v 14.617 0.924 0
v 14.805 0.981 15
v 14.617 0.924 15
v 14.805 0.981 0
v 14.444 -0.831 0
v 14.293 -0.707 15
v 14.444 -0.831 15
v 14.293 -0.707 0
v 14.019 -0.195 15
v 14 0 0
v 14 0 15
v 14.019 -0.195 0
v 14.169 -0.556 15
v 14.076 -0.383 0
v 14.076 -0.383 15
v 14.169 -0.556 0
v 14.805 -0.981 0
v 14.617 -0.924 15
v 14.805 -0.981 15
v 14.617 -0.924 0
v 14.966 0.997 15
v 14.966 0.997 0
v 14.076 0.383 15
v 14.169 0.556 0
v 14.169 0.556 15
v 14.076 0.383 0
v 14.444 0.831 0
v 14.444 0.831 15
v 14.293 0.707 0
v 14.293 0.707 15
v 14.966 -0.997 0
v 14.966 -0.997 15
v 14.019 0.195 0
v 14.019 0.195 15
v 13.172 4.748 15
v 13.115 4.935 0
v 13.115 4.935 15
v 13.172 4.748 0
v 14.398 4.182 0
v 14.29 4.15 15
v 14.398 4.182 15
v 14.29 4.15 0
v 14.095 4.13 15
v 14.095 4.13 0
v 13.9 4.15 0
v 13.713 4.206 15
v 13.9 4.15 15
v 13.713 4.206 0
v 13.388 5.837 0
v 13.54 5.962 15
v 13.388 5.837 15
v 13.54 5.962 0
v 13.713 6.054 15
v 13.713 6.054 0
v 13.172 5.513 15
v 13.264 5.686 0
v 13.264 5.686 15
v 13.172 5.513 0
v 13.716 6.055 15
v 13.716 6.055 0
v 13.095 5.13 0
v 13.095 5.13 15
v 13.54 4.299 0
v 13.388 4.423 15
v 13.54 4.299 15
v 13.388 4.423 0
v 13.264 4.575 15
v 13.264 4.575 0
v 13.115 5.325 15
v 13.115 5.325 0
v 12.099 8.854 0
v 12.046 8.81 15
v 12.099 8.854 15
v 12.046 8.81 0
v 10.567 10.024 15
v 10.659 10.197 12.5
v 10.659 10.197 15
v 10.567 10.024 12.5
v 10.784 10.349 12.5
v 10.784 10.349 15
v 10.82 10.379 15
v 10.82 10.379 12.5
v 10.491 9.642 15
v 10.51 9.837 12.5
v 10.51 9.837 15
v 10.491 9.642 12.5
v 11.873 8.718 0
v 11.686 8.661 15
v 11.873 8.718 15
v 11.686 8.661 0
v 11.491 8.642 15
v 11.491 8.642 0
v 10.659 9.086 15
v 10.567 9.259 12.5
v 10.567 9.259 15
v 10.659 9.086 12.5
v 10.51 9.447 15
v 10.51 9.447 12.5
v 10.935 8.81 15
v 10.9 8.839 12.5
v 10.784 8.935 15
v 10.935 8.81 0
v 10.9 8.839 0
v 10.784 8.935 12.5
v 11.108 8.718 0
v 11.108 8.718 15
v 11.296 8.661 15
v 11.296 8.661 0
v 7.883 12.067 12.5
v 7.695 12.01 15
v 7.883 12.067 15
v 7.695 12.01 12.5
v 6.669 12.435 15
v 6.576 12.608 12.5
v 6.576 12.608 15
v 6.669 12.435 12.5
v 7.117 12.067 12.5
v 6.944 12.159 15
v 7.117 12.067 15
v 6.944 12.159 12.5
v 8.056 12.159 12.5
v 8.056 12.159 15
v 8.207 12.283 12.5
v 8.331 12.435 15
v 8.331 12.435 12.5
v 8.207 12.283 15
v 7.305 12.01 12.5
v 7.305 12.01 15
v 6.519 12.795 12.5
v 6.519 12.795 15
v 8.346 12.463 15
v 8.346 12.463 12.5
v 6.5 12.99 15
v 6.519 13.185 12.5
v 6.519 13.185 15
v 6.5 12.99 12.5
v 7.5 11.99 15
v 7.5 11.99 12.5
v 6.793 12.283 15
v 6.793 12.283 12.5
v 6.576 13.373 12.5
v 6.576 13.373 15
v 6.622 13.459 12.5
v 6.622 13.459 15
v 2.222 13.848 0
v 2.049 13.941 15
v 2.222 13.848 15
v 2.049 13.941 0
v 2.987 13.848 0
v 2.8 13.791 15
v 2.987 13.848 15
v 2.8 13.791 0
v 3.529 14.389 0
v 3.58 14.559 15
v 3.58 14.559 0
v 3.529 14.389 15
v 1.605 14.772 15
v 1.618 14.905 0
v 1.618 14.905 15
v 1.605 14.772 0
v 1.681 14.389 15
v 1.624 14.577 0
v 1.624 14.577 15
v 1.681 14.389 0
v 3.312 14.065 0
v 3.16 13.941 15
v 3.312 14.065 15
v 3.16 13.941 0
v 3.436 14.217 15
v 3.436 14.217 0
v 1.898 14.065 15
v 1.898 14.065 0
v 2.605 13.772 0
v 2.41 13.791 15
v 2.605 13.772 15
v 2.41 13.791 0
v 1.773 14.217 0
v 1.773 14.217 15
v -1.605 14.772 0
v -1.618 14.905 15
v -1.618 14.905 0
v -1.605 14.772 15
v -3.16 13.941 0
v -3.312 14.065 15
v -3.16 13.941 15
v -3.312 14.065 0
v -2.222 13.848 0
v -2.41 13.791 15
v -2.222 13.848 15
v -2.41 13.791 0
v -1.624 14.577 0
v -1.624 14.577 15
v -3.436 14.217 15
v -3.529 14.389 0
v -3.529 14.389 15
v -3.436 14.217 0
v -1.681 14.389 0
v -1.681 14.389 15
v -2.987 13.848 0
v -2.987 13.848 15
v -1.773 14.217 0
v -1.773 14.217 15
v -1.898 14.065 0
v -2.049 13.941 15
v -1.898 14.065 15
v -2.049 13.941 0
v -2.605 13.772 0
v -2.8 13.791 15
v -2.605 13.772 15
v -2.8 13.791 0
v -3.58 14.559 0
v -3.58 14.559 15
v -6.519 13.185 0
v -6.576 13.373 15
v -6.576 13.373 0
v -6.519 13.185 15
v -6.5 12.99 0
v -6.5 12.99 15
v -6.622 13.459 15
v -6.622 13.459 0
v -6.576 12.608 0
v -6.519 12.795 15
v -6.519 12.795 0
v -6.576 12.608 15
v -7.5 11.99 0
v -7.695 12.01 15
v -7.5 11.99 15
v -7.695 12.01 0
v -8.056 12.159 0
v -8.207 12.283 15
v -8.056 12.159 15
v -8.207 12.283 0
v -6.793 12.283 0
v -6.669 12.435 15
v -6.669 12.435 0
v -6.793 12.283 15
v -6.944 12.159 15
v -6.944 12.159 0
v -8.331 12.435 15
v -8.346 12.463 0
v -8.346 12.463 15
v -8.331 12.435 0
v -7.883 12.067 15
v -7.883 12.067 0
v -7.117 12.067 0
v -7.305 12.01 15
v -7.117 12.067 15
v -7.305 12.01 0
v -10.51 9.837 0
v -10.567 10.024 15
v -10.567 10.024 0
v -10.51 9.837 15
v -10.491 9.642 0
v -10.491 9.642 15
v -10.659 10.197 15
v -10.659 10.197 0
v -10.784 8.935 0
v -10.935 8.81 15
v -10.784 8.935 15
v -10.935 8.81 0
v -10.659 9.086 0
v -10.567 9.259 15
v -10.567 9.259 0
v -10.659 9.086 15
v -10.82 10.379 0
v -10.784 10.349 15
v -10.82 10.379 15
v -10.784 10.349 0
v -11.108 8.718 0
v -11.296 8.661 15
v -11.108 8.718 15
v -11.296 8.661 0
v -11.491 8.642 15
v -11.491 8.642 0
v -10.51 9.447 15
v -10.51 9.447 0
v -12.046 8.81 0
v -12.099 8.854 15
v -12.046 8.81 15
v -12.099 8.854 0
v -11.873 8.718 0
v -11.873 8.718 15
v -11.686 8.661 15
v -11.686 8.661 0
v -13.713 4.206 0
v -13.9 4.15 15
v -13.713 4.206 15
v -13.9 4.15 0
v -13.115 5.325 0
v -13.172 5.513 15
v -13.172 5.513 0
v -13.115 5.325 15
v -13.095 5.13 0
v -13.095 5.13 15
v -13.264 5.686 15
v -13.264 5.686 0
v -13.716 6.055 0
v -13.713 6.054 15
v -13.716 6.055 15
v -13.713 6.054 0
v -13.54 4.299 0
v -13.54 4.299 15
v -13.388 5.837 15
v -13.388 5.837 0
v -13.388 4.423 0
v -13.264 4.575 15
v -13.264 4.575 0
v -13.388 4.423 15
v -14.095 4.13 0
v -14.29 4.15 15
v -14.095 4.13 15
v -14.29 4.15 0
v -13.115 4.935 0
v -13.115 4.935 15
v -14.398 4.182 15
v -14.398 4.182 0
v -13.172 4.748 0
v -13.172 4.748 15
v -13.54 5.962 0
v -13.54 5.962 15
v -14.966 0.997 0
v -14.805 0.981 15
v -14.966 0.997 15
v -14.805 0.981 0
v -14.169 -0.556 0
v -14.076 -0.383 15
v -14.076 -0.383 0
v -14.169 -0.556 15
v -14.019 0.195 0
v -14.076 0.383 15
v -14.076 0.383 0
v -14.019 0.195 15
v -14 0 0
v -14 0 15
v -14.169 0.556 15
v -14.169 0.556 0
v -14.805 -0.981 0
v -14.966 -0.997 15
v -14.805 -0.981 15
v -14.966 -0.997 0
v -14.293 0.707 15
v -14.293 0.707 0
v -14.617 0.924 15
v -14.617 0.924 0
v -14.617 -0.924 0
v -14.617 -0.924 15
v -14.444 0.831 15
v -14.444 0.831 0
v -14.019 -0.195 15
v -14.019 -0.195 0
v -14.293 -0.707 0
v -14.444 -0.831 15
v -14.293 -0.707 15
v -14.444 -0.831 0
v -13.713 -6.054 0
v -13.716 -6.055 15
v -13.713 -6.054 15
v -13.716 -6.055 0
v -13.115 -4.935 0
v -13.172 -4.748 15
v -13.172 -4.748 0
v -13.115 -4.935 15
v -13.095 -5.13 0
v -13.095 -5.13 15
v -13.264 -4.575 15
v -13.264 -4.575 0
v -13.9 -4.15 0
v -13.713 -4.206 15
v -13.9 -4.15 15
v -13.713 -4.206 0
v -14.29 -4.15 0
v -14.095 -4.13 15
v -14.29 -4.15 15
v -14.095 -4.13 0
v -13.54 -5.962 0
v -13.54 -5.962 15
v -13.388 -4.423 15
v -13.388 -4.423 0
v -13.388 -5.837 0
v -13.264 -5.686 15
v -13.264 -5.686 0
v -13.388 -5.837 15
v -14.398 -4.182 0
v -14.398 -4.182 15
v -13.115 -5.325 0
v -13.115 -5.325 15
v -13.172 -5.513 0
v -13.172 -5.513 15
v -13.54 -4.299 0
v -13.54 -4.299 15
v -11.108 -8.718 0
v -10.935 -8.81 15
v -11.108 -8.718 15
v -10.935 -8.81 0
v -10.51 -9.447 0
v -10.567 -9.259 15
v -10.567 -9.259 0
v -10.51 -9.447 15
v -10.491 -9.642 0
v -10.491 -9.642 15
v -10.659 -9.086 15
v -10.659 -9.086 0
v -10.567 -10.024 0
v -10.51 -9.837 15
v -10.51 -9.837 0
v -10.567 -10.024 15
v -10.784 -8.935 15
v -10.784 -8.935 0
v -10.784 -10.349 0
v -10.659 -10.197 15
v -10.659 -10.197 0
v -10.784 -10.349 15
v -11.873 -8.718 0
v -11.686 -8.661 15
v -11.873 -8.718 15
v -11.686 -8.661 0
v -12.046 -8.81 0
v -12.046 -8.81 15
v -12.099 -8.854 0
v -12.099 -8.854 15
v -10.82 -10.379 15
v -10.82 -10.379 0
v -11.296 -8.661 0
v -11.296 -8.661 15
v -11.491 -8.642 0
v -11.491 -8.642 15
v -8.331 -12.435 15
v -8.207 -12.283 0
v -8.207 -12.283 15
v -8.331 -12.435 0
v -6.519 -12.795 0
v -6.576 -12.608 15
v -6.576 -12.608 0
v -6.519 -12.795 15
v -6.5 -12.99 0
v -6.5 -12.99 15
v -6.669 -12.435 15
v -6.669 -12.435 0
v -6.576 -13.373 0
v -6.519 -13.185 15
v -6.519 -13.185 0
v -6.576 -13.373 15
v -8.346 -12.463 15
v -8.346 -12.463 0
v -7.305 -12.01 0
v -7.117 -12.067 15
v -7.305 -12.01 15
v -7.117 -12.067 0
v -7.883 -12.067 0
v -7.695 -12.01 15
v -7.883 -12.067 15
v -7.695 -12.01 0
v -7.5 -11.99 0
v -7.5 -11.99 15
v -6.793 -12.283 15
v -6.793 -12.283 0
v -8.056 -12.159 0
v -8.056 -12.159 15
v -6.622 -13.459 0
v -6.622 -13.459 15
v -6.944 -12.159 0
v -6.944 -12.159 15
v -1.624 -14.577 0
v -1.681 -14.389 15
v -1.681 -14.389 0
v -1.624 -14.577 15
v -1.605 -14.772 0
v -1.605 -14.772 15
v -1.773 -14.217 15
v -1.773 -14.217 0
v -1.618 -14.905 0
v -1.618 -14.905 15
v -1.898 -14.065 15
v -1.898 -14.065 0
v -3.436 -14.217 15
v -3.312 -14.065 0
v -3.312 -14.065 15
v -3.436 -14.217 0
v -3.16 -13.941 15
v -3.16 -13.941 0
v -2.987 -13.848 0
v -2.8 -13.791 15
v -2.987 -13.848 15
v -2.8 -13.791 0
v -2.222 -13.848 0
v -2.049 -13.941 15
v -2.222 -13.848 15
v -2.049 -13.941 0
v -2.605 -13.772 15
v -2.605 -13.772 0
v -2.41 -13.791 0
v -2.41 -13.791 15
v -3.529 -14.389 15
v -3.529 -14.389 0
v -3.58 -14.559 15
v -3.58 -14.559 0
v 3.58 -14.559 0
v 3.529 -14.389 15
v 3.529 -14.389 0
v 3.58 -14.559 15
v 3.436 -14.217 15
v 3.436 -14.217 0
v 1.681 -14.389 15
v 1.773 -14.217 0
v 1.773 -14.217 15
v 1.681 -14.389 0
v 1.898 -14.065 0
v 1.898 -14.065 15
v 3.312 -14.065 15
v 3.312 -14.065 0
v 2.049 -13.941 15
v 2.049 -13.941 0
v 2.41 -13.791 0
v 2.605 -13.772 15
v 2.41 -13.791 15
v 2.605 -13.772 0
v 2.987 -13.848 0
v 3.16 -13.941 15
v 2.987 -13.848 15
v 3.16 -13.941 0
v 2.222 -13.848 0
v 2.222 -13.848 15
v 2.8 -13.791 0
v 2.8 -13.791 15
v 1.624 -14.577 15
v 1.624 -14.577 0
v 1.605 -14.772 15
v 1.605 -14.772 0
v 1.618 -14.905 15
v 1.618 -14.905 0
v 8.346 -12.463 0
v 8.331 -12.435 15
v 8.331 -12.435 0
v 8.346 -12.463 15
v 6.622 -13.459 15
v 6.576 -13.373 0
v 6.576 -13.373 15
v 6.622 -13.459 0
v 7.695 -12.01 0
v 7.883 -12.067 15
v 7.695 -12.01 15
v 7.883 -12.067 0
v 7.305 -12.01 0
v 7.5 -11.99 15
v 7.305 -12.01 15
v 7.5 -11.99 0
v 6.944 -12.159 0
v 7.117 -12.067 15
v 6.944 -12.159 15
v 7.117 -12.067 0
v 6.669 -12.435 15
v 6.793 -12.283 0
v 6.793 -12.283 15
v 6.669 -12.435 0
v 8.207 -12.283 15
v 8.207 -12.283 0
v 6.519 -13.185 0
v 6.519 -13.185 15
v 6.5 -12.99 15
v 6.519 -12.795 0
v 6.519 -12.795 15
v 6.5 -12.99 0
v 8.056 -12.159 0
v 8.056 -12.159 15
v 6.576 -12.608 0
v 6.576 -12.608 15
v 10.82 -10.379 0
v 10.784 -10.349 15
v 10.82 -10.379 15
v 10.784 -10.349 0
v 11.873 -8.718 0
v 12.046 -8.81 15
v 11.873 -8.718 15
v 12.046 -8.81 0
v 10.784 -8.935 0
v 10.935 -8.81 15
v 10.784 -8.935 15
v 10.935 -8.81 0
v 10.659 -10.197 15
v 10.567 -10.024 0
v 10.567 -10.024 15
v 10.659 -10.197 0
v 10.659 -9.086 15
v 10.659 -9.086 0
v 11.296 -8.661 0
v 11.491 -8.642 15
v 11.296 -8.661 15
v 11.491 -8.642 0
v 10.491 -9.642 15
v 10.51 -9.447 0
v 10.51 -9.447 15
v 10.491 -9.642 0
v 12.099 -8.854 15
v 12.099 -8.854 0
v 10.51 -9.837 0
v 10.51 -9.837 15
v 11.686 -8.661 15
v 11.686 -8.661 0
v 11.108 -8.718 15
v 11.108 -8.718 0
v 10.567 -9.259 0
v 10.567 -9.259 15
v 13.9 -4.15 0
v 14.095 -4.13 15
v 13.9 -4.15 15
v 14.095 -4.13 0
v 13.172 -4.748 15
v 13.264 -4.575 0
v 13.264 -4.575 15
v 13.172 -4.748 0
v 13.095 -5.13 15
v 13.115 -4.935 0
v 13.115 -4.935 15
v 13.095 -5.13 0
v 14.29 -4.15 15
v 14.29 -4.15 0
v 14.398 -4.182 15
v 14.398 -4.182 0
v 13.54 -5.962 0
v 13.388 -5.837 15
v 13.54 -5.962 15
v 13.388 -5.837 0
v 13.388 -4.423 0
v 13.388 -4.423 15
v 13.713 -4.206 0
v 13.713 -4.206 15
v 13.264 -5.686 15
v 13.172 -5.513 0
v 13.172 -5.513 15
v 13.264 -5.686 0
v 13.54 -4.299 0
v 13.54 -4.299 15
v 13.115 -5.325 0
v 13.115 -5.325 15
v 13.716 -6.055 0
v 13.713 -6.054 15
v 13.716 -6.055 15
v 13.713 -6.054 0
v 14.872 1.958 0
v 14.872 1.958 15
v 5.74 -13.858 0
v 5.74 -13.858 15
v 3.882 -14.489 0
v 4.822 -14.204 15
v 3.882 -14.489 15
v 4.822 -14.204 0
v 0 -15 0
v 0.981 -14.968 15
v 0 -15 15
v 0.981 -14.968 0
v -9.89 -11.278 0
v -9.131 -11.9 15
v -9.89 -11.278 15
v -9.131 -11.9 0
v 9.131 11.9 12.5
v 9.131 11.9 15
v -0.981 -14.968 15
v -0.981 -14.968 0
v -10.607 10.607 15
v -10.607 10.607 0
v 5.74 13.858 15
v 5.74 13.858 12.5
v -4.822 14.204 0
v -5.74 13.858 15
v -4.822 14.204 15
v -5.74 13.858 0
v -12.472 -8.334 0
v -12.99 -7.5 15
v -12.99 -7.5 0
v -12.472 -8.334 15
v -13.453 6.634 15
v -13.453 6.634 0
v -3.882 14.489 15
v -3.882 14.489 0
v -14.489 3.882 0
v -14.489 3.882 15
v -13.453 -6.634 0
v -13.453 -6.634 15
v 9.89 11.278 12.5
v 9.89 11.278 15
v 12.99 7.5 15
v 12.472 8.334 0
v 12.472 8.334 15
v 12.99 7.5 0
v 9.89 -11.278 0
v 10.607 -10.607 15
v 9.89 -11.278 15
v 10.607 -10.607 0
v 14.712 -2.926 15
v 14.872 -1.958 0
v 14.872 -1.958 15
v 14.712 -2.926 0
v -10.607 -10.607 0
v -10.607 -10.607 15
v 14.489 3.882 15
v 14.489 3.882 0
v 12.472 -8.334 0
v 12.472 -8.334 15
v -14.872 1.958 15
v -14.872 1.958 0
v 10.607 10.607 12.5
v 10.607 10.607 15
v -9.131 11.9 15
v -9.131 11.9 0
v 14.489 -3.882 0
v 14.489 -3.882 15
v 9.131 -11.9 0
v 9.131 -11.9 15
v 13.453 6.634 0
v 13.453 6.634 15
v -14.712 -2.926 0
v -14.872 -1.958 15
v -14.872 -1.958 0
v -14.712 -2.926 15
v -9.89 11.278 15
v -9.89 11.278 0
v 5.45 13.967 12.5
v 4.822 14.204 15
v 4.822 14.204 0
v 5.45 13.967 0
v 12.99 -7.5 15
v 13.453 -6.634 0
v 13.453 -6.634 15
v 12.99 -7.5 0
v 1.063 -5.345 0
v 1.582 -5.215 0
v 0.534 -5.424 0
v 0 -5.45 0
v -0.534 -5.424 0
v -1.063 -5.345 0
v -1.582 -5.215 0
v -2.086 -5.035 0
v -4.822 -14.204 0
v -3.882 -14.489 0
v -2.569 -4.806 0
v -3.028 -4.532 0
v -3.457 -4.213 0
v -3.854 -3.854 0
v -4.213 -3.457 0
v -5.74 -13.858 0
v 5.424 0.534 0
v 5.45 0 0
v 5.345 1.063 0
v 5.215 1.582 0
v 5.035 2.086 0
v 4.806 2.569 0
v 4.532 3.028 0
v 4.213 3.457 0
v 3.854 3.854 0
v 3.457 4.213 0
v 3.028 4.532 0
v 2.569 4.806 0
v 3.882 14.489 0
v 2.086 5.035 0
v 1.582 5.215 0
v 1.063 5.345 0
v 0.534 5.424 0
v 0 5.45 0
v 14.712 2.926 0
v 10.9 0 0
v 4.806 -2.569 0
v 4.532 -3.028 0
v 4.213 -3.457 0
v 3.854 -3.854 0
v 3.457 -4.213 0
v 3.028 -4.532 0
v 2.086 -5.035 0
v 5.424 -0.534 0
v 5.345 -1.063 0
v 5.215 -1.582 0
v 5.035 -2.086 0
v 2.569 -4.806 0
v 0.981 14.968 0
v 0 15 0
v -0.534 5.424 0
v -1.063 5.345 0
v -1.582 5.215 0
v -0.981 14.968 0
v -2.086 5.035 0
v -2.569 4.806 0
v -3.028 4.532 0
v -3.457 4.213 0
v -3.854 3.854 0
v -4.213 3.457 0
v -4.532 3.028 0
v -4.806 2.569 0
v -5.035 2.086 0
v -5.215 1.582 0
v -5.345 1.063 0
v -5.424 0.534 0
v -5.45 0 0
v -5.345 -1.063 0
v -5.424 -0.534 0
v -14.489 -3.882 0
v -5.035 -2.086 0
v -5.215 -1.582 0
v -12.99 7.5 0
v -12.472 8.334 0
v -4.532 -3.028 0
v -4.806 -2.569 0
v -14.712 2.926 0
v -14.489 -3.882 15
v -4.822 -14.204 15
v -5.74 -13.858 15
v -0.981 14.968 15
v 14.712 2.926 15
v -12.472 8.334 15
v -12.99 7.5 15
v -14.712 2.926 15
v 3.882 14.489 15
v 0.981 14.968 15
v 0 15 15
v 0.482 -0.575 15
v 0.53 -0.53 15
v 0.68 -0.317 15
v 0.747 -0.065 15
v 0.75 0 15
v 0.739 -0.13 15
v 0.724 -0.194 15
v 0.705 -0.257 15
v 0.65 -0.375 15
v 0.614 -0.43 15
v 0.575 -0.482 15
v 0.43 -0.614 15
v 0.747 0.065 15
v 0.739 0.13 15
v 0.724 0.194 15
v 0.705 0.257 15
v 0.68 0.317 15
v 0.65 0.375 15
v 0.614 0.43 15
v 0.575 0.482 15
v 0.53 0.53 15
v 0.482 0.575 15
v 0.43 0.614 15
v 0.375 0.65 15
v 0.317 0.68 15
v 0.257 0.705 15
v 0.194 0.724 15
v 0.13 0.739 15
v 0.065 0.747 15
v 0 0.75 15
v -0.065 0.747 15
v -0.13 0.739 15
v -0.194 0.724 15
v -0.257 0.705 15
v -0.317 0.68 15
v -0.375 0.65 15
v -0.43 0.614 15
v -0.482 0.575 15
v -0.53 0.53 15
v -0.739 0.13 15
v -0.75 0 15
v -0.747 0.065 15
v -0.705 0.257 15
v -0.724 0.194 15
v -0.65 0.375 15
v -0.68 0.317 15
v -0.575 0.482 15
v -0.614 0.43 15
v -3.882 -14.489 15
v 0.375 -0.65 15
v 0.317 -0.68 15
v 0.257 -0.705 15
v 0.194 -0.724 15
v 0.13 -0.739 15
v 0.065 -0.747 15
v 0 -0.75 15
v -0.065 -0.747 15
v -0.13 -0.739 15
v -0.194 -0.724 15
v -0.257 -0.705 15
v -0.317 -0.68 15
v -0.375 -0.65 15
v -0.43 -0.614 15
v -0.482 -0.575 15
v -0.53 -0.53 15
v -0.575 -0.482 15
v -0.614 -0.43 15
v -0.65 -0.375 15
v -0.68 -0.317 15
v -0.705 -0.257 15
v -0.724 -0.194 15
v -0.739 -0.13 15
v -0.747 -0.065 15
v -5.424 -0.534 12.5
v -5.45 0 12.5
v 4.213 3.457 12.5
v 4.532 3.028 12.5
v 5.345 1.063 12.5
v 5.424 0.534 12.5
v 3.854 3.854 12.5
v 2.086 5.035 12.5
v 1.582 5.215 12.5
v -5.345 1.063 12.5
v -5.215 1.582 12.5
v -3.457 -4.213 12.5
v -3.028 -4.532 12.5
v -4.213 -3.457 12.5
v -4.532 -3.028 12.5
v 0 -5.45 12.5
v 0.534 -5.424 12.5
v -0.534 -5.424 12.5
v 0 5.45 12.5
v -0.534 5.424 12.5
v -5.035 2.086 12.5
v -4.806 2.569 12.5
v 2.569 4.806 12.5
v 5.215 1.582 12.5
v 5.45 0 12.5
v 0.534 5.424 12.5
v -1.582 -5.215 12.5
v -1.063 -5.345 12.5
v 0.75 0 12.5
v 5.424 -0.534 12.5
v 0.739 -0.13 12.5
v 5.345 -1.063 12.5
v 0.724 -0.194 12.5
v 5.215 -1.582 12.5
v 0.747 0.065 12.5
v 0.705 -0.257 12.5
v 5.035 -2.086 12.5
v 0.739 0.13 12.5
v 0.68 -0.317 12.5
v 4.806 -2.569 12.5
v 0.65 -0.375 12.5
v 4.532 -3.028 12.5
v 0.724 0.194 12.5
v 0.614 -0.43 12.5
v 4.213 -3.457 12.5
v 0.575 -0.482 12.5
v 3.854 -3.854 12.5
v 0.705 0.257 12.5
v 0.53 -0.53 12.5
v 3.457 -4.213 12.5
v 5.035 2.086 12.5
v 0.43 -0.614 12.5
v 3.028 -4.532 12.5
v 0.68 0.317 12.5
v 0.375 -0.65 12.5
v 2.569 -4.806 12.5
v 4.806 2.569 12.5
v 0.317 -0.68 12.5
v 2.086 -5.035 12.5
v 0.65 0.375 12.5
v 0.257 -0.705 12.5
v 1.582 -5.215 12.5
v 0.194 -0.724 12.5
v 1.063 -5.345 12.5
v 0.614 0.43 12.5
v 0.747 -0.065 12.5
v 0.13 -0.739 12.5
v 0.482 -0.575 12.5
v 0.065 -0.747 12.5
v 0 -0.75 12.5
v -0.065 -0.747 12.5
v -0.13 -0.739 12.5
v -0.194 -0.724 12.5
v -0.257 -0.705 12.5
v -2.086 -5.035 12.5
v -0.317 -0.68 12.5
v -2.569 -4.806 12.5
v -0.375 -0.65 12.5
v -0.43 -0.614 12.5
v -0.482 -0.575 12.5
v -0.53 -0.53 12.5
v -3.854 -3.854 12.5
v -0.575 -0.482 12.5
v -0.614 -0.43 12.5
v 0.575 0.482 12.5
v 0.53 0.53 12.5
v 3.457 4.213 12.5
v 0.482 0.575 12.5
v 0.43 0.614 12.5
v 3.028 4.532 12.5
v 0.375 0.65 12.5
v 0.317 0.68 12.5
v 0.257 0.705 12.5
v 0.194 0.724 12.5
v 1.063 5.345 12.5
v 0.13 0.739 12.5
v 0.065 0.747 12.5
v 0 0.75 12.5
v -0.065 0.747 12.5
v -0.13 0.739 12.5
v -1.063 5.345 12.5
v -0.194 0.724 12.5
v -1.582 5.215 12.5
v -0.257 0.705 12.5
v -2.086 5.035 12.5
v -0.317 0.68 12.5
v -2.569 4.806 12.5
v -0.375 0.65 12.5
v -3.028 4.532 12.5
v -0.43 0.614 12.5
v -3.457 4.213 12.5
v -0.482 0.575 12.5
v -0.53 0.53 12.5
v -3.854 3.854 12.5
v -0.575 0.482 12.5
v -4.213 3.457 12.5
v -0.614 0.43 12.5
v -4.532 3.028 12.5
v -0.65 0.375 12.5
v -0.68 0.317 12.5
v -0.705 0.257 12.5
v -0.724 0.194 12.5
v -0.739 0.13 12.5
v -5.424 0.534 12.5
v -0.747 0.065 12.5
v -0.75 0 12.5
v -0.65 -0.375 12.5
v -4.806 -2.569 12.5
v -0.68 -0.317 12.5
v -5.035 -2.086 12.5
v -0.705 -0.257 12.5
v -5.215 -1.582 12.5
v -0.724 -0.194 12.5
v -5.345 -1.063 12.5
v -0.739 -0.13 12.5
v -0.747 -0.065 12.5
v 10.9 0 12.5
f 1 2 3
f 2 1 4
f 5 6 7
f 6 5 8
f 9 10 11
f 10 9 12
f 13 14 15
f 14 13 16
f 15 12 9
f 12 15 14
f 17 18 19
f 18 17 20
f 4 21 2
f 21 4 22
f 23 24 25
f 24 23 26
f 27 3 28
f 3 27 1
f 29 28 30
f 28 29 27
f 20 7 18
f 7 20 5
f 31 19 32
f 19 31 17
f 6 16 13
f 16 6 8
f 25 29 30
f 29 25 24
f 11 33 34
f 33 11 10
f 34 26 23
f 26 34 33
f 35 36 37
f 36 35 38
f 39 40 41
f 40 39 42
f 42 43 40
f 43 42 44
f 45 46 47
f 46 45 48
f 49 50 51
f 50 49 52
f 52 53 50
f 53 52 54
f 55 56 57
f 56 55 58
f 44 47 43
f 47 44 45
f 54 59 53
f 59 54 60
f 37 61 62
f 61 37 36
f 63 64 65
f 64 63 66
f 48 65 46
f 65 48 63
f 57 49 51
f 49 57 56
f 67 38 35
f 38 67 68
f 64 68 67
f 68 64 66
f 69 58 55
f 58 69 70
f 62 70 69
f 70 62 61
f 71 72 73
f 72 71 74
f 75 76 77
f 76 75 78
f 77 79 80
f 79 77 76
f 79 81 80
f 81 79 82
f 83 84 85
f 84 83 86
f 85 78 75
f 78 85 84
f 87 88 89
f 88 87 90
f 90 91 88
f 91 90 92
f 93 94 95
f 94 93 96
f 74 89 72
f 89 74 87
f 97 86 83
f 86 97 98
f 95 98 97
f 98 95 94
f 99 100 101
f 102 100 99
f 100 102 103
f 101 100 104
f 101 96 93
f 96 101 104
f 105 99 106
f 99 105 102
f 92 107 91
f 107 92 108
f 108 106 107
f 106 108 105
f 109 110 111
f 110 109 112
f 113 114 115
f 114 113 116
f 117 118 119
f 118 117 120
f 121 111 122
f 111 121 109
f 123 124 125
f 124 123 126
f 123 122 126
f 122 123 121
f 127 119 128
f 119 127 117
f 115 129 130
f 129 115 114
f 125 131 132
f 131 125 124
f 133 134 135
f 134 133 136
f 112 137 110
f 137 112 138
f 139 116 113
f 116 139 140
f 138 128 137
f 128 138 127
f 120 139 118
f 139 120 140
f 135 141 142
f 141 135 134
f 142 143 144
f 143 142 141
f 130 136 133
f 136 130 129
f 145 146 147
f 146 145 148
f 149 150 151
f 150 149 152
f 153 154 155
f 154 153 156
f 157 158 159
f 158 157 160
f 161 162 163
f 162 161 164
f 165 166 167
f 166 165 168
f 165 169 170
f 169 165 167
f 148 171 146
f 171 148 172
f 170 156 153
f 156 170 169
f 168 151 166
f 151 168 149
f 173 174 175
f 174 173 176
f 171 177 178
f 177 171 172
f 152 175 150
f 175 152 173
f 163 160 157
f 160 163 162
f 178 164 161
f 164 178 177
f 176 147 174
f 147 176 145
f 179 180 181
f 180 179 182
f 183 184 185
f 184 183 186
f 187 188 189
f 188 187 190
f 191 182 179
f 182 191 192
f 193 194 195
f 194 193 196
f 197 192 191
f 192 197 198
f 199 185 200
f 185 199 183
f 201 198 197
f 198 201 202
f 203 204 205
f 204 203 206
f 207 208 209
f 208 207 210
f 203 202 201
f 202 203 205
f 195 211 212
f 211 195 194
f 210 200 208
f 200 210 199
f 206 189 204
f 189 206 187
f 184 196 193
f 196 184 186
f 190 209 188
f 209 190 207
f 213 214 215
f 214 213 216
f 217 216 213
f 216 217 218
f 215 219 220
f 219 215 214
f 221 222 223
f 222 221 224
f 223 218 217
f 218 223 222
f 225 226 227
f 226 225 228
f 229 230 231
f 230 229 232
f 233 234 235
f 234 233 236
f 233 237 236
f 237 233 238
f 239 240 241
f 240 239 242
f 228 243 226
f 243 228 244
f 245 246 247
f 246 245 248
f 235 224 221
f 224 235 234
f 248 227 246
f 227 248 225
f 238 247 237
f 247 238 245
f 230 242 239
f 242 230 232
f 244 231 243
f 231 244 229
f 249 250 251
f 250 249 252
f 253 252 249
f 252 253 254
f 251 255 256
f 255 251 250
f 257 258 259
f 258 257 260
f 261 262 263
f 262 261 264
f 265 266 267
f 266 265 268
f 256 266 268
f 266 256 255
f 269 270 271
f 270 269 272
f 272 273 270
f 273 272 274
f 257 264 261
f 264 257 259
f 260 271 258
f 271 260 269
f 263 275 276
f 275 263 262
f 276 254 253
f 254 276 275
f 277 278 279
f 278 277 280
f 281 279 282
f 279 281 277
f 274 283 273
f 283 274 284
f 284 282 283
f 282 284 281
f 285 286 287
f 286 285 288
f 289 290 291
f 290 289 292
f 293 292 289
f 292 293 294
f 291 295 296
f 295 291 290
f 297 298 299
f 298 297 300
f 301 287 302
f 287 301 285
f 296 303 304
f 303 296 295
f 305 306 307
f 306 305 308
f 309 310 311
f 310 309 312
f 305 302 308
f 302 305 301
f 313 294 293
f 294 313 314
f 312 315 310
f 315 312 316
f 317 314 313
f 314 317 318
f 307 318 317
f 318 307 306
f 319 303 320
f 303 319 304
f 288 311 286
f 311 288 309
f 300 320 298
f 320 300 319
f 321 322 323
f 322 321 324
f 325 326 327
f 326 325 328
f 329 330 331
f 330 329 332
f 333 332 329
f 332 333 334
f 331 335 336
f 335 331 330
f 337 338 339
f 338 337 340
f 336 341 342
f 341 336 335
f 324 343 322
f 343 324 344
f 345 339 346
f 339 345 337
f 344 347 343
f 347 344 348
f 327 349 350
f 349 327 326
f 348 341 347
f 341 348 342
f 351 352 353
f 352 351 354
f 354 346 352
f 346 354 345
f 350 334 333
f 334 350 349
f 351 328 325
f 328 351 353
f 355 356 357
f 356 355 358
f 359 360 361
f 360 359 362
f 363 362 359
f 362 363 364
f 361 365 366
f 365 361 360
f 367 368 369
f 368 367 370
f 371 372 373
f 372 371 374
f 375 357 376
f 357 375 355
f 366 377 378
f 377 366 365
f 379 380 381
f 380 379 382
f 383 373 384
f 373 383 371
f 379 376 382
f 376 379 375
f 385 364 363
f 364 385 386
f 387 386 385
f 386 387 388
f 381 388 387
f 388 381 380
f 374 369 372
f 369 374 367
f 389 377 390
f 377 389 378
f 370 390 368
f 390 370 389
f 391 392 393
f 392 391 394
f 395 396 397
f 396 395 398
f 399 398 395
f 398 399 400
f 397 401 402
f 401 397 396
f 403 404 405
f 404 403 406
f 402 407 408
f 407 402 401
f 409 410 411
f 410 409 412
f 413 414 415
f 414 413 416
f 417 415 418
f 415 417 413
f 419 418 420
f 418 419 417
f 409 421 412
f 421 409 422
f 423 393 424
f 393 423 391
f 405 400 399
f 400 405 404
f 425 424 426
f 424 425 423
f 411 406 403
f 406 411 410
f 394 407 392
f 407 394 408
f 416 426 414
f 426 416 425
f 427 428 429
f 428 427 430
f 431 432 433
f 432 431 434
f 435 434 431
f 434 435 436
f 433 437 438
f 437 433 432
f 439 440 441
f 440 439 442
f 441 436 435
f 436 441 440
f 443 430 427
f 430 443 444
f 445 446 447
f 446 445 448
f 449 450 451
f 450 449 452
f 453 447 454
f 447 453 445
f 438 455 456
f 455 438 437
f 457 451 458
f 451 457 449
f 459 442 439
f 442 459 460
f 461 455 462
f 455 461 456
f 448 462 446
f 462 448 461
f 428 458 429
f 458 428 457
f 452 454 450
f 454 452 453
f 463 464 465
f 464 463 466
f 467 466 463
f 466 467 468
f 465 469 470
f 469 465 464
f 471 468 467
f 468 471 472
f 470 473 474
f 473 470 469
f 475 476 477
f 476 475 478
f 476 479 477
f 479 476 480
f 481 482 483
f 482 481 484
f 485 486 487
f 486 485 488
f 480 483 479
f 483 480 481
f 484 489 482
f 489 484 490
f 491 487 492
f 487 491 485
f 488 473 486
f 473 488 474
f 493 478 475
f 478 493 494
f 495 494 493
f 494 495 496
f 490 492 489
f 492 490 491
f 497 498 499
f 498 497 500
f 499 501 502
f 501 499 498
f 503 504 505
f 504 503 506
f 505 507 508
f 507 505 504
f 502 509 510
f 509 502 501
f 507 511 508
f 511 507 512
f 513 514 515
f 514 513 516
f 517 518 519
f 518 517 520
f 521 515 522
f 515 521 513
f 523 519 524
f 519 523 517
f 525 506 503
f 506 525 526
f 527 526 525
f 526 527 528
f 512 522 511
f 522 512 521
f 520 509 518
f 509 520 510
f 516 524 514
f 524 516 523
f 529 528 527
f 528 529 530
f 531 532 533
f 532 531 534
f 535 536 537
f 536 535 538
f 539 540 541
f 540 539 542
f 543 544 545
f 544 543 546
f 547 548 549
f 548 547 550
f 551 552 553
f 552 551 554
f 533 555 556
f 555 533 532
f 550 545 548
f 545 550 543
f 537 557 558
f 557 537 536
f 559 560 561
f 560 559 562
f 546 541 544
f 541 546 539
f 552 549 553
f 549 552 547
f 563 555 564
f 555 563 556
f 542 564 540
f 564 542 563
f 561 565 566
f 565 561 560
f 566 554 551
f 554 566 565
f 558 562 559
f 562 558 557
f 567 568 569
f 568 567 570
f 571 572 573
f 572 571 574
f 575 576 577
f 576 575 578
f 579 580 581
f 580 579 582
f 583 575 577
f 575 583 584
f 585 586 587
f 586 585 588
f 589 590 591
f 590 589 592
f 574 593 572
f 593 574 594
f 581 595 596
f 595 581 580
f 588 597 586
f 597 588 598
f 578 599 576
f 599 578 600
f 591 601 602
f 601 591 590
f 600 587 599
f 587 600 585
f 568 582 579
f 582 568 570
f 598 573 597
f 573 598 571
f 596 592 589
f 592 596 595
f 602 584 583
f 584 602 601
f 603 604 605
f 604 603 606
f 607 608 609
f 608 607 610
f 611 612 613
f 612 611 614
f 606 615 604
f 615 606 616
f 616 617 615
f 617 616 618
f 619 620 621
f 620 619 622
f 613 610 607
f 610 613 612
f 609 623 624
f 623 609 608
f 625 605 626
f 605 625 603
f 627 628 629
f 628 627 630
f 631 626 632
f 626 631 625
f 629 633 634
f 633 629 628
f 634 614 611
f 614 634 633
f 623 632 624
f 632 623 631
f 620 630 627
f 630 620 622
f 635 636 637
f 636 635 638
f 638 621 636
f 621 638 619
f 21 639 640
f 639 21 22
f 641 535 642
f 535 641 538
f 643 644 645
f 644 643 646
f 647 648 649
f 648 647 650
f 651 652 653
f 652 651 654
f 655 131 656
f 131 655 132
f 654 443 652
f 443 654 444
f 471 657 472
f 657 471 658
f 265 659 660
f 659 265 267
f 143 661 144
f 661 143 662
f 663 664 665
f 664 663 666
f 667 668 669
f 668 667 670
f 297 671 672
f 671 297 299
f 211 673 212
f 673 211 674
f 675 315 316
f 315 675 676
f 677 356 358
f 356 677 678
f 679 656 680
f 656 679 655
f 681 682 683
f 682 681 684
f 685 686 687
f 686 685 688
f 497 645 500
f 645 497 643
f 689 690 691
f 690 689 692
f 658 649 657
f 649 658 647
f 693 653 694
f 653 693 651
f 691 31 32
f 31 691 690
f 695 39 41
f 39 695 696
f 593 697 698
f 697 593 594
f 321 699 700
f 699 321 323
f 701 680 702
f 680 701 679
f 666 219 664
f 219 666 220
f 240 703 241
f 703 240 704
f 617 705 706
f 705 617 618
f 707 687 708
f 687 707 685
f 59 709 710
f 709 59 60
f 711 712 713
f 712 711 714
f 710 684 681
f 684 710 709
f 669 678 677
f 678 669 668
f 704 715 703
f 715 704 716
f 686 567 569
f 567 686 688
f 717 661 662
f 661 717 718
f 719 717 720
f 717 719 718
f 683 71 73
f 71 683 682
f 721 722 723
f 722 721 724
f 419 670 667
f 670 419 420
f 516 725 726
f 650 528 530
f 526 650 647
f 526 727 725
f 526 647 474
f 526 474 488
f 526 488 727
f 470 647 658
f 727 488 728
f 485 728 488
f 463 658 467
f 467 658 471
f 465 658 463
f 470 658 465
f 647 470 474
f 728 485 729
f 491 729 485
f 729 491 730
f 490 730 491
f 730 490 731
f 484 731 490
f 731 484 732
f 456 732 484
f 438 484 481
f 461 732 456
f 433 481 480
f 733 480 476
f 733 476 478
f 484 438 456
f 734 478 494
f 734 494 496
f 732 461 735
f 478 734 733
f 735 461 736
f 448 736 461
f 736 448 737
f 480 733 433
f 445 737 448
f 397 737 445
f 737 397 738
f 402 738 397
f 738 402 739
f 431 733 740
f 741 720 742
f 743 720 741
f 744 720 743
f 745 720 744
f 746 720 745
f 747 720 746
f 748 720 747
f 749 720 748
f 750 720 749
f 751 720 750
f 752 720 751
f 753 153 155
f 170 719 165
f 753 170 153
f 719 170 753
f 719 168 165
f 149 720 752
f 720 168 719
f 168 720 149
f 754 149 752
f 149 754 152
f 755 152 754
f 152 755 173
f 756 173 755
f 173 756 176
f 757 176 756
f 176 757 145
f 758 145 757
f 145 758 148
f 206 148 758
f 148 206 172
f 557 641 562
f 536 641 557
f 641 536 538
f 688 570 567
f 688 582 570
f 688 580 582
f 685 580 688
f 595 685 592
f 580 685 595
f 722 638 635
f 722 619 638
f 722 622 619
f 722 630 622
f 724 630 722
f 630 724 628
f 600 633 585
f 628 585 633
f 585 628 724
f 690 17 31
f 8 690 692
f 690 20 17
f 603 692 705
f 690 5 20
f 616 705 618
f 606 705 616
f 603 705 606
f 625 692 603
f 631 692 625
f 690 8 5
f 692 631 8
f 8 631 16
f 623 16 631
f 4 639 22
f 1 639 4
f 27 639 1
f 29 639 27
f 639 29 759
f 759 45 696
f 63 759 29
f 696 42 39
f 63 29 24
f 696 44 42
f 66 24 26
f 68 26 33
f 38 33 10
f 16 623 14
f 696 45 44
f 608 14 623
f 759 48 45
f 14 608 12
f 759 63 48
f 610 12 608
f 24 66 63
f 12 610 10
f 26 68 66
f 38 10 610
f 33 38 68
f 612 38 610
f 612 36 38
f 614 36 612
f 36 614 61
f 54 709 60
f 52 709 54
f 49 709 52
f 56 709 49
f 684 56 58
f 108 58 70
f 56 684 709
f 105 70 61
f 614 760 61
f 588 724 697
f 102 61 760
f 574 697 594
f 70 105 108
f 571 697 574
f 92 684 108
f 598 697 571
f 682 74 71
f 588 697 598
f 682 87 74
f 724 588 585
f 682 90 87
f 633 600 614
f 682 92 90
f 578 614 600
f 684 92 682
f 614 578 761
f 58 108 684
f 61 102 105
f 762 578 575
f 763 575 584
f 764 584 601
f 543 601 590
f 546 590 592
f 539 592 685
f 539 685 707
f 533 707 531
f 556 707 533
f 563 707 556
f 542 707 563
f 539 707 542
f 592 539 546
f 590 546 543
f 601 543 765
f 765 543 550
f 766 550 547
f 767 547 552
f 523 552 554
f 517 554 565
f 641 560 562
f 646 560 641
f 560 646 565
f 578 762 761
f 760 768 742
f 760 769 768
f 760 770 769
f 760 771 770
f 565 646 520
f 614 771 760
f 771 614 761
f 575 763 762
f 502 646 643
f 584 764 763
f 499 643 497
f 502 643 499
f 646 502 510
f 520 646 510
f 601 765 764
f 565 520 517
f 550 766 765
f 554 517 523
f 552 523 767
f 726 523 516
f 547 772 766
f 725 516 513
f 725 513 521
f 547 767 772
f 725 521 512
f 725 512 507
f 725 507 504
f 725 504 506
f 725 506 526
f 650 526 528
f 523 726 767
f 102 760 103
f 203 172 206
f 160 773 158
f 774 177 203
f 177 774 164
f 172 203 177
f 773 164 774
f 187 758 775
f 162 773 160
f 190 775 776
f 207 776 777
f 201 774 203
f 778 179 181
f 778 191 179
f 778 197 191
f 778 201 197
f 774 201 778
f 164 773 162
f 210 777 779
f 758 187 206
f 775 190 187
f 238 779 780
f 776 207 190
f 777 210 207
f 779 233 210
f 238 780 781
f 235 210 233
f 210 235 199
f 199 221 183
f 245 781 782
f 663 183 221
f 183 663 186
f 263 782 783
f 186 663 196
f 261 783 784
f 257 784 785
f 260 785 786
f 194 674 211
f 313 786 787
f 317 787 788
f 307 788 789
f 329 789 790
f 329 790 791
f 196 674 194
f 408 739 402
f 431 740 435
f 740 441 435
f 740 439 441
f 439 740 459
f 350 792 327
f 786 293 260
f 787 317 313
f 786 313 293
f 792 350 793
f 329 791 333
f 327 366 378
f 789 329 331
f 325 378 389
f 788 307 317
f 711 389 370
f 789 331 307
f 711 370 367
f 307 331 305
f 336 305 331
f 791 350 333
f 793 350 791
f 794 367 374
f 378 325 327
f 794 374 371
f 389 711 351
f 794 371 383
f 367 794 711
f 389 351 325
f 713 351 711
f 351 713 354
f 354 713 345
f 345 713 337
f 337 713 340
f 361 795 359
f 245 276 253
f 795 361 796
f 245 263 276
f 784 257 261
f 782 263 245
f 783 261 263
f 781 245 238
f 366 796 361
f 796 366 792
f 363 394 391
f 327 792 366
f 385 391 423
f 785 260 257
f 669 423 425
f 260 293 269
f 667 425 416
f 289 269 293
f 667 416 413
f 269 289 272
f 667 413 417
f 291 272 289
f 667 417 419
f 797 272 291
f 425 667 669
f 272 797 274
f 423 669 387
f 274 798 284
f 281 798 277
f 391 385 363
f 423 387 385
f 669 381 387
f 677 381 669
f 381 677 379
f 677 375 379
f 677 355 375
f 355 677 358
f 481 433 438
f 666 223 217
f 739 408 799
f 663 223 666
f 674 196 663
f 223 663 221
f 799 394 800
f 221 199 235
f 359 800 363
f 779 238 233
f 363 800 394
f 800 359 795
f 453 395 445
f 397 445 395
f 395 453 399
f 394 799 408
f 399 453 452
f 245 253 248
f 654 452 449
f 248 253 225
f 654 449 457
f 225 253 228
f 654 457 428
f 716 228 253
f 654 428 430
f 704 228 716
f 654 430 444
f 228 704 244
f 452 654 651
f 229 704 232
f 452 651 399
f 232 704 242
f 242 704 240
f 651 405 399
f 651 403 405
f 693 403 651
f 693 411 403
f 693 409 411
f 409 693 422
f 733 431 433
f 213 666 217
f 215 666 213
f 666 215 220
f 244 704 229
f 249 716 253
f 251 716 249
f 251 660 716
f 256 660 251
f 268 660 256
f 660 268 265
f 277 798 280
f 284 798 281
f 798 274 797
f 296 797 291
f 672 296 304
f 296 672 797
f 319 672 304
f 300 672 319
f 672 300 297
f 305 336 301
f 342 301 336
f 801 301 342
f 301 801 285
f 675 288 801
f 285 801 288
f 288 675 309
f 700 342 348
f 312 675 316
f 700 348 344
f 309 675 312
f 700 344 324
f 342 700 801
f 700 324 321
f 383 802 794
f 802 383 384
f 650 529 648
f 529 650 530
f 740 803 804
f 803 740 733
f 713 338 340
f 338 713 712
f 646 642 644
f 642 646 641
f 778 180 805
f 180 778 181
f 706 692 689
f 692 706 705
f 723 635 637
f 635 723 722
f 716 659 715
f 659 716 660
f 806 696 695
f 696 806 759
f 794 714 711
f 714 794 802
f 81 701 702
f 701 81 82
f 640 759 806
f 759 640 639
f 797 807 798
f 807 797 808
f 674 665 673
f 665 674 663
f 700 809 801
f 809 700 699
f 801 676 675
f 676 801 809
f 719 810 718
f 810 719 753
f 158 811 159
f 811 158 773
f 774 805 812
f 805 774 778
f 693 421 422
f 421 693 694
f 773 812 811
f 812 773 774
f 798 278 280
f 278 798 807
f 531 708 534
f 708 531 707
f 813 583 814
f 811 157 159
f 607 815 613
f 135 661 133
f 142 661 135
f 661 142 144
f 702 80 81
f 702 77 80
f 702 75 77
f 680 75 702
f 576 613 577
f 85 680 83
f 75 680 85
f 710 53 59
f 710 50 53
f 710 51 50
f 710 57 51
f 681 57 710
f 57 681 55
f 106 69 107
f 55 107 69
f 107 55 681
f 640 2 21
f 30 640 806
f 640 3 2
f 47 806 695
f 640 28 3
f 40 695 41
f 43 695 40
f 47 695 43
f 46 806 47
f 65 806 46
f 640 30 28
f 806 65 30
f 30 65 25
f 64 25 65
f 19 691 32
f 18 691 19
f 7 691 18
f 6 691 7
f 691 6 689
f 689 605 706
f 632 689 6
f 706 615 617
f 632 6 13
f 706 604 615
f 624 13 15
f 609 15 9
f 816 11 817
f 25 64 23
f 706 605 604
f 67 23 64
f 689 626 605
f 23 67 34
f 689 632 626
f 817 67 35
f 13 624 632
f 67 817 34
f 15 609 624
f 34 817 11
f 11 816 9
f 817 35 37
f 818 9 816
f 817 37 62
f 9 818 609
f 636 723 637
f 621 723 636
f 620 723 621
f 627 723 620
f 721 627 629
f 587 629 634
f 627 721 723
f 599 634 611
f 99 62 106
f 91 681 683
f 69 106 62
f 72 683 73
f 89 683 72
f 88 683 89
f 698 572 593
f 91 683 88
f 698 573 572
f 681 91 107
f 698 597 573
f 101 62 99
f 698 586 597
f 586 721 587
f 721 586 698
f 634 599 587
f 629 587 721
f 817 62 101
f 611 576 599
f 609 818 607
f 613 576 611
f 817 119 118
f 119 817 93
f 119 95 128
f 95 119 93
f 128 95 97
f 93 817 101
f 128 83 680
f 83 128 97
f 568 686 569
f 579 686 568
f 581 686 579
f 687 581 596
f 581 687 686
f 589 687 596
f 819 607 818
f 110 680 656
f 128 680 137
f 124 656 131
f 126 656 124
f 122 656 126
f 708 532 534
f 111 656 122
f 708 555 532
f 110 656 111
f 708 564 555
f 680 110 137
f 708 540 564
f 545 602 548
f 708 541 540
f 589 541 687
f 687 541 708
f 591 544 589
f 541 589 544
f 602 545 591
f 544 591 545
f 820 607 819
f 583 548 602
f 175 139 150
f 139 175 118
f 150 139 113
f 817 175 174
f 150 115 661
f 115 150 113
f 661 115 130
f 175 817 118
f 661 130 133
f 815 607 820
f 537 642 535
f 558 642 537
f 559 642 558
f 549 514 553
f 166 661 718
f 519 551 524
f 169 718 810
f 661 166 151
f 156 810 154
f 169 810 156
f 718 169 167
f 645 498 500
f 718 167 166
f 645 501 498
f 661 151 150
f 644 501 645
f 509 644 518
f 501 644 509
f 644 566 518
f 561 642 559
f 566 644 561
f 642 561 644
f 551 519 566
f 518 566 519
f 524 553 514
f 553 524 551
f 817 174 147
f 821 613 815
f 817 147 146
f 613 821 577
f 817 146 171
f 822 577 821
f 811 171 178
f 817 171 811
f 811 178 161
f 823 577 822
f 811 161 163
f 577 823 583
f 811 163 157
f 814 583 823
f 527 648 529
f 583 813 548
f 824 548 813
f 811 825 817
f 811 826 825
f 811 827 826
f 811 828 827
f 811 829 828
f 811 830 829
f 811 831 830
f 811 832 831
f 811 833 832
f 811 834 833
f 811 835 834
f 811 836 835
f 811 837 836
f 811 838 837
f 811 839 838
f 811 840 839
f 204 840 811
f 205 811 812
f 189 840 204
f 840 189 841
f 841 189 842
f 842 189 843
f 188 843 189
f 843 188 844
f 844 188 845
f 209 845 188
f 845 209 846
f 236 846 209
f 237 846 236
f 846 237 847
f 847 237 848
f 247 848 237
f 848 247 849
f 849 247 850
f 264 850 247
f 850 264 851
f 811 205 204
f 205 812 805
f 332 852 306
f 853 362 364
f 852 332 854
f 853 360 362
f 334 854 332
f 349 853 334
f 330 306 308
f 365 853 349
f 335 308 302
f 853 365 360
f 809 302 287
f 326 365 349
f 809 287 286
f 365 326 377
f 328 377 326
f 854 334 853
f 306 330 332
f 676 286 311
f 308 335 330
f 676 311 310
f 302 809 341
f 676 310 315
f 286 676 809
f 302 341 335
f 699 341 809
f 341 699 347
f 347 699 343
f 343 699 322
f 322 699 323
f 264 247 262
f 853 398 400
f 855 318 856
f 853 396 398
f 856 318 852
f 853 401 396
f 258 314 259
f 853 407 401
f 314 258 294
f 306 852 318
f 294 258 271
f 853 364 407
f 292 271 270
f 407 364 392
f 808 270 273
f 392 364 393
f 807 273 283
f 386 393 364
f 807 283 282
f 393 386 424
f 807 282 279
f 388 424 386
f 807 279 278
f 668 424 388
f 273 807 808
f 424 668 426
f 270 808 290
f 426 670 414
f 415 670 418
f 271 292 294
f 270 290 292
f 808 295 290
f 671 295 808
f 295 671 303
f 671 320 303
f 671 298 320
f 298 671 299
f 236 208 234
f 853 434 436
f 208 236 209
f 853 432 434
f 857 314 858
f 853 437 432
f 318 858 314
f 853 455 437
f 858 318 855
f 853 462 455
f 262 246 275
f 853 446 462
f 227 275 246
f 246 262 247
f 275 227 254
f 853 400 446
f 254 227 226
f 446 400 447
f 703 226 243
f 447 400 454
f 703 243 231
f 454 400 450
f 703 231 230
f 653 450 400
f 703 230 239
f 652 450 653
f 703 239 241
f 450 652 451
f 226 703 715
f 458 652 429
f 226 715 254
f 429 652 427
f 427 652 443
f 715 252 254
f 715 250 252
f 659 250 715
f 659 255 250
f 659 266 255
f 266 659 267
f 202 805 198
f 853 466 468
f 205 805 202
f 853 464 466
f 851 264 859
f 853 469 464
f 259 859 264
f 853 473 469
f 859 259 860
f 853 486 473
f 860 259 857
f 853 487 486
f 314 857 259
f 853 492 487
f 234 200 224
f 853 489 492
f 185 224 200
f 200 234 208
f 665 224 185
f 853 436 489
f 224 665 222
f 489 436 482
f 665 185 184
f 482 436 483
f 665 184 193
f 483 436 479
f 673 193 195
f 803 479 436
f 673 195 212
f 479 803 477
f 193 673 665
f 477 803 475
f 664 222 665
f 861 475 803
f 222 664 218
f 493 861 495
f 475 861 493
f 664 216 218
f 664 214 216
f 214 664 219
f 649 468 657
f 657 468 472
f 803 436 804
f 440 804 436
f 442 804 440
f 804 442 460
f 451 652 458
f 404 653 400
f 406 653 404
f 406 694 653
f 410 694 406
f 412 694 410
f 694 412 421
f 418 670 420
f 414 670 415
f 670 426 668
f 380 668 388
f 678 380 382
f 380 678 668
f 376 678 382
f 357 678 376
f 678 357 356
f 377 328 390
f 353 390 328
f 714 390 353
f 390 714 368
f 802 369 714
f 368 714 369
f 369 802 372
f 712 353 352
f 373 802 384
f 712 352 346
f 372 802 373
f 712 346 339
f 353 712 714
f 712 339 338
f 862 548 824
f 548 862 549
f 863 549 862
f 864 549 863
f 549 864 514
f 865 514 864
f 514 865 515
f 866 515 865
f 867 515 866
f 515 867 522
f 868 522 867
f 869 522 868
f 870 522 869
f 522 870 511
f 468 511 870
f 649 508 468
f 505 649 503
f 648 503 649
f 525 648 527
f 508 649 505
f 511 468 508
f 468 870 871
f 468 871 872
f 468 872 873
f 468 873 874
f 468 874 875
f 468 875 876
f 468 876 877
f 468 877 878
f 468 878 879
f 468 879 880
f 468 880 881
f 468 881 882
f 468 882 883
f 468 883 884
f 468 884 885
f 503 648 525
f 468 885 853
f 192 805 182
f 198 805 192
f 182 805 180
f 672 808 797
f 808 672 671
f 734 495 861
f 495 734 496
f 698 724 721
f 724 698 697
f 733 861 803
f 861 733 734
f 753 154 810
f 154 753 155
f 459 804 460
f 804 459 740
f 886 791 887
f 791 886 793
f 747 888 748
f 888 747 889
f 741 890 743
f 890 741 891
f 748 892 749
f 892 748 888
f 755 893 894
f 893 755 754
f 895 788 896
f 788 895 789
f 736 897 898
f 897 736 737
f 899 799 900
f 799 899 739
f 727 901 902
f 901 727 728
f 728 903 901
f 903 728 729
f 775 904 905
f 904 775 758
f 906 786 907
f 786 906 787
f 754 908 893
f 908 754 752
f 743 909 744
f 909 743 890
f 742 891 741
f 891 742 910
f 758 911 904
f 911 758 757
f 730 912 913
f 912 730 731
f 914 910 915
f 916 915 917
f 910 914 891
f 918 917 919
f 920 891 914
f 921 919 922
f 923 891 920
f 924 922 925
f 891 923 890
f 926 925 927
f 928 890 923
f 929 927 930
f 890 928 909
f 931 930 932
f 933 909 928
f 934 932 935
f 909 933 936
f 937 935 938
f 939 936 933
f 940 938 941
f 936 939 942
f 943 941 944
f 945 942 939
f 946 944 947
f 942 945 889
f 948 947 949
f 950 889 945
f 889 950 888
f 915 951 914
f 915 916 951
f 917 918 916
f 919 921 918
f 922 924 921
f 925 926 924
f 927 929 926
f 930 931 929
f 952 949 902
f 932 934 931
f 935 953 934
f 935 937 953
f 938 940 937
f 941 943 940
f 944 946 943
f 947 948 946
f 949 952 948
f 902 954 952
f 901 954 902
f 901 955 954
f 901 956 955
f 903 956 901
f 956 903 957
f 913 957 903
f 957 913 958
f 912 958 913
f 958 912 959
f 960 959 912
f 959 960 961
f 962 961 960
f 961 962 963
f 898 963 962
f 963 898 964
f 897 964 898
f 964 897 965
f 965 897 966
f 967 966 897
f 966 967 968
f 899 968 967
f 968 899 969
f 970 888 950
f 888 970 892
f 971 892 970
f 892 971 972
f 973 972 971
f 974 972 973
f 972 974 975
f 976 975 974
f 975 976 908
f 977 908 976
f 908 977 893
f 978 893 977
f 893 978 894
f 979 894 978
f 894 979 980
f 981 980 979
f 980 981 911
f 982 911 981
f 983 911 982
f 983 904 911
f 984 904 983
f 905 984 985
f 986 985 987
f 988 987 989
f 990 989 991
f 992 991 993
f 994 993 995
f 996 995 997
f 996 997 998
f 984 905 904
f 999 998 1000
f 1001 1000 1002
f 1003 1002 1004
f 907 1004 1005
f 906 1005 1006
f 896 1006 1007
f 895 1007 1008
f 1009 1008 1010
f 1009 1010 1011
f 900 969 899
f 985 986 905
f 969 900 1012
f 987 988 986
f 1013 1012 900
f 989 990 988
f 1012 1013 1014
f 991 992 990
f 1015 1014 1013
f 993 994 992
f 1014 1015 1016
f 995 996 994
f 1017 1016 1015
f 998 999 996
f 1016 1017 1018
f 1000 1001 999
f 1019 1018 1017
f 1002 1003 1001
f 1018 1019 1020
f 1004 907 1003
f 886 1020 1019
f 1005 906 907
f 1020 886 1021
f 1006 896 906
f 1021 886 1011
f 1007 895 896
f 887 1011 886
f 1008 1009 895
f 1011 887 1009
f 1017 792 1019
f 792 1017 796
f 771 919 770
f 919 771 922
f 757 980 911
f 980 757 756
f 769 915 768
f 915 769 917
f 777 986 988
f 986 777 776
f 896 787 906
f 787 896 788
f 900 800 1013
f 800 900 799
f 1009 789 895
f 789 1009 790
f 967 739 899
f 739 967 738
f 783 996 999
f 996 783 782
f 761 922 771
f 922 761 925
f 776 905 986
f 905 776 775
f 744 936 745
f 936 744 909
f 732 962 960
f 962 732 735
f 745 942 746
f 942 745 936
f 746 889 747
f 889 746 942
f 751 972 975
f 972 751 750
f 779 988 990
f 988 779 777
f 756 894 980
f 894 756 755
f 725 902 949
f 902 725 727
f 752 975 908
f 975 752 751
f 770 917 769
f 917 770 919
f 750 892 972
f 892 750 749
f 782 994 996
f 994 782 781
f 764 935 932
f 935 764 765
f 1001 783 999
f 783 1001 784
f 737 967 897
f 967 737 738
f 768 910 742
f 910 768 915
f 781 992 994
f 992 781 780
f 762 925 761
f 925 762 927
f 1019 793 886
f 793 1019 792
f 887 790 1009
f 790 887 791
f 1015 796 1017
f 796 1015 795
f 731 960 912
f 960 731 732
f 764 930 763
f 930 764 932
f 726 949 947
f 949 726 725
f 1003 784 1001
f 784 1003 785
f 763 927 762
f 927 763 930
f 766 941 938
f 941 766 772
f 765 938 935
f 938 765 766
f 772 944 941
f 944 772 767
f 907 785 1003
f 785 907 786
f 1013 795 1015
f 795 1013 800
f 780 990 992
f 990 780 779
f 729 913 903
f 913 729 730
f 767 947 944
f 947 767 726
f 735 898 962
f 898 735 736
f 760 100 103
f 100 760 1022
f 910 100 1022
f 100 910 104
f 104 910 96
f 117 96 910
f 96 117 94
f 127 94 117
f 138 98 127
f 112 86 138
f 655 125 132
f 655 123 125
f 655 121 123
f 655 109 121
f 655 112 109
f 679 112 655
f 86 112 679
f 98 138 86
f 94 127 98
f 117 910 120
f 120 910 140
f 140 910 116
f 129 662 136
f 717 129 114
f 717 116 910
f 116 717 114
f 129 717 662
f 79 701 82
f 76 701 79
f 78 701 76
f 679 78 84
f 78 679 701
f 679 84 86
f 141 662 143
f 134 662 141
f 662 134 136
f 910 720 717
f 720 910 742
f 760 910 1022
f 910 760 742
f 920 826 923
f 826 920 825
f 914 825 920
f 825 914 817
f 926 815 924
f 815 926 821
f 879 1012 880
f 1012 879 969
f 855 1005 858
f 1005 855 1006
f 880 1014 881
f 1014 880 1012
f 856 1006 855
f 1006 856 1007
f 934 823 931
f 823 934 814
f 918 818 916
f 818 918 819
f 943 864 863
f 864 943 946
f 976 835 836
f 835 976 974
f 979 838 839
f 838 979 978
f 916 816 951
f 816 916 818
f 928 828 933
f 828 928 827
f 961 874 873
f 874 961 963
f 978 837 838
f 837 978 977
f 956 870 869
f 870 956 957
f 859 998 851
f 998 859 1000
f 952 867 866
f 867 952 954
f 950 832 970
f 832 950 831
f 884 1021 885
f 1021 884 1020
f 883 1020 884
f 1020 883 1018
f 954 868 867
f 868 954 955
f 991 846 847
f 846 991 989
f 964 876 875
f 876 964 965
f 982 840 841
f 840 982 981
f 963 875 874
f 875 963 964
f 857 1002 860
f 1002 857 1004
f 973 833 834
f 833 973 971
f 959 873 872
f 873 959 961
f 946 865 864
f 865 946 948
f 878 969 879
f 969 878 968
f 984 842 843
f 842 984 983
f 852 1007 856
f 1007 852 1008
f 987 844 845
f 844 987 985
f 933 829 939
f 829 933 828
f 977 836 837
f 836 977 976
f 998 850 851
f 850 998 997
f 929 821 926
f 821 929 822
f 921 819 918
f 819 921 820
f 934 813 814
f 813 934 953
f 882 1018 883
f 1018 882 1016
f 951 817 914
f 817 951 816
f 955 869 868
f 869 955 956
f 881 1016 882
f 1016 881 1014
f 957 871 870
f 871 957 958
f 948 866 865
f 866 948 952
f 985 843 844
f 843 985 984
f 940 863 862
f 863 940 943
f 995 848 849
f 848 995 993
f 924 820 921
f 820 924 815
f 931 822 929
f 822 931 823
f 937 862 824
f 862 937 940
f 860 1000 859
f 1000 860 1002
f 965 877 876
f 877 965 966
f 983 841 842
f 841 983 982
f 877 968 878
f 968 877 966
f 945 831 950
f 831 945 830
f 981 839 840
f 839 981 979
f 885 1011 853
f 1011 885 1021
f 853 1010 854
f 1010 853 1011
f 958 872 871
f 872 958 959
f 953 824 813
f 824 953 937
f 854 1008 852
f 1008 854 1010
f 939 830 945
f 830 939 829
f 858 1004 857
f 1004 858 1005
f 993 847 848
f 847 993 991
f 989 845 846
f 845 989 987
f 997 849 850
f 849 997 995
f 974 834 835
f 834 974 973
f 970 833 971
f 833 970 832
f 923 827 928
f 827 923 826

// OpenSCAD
// Replacement knob for hotplate stirrer (D-shaft)
// Print orientation: D-flat side down on bed (z = 0)

// ---------------- Parameters ----------------
knob_d        = 30;    // knob outer diameter
knob_h        = 15;    // knob height
shaft_d       = 6.2;   // D-shaft diameter
bore_depth    = 12;    // blind bore depth from bottom face
bore_flat     = 4.7;   // D-bore flat-to-flat distance (across circle)
groove_count  = 18;    // number of grip grooves
groove_d      = 2;     // grip groove diameter (half-cylinder)
pointer_w     = 1.5;   // pointer groove width
pointer_d    = pointer_w; // pointer groove depth (same as width)
eps           = 0.5;   // cutter overshoot past faces

// Derived
knob_r = knob_d / 2;
// D-bore radius from flat-to-flat: 2*R - flat = bore_flat
bore_r = (bore_flat + shaft_d) / 2;

// ---------------- Model ----------------
difference() {
    // Main cylinder
    cylinder(d = knob_d, h = knob_h, $fn = 96);

    // D-shaped blind bore, centred on axis, flat on +x side
    translate([0, 0, -eps])
        cylinder(r = bore_r, h = bore_depth + 2 * eps, $fn = 64);
    translate([bore_r, 0, -eps])
        cube([bore_r, 2 * knob_r, bore_depth + 2 * eps]);

    // Grip grooves: vertical half-cylinders centred on outer surface
    for (i = [0 : groove_count - 1]) {
        a = i * 360 / groove_count;
        translate([knob_r * cos(a), knob_r * sin(a), -eps])
            cylinder(d = groove_d, h = knob_h + 2 * eps, $fn = 32);
    }

    // Pointer groove: runs from centre to outer edge on +x side
    translate([0, 0, -eps])
        linear_extrude(height = knob_h + 2 * eps)
            circle(d = pointer_w, $fn = 72);
}
